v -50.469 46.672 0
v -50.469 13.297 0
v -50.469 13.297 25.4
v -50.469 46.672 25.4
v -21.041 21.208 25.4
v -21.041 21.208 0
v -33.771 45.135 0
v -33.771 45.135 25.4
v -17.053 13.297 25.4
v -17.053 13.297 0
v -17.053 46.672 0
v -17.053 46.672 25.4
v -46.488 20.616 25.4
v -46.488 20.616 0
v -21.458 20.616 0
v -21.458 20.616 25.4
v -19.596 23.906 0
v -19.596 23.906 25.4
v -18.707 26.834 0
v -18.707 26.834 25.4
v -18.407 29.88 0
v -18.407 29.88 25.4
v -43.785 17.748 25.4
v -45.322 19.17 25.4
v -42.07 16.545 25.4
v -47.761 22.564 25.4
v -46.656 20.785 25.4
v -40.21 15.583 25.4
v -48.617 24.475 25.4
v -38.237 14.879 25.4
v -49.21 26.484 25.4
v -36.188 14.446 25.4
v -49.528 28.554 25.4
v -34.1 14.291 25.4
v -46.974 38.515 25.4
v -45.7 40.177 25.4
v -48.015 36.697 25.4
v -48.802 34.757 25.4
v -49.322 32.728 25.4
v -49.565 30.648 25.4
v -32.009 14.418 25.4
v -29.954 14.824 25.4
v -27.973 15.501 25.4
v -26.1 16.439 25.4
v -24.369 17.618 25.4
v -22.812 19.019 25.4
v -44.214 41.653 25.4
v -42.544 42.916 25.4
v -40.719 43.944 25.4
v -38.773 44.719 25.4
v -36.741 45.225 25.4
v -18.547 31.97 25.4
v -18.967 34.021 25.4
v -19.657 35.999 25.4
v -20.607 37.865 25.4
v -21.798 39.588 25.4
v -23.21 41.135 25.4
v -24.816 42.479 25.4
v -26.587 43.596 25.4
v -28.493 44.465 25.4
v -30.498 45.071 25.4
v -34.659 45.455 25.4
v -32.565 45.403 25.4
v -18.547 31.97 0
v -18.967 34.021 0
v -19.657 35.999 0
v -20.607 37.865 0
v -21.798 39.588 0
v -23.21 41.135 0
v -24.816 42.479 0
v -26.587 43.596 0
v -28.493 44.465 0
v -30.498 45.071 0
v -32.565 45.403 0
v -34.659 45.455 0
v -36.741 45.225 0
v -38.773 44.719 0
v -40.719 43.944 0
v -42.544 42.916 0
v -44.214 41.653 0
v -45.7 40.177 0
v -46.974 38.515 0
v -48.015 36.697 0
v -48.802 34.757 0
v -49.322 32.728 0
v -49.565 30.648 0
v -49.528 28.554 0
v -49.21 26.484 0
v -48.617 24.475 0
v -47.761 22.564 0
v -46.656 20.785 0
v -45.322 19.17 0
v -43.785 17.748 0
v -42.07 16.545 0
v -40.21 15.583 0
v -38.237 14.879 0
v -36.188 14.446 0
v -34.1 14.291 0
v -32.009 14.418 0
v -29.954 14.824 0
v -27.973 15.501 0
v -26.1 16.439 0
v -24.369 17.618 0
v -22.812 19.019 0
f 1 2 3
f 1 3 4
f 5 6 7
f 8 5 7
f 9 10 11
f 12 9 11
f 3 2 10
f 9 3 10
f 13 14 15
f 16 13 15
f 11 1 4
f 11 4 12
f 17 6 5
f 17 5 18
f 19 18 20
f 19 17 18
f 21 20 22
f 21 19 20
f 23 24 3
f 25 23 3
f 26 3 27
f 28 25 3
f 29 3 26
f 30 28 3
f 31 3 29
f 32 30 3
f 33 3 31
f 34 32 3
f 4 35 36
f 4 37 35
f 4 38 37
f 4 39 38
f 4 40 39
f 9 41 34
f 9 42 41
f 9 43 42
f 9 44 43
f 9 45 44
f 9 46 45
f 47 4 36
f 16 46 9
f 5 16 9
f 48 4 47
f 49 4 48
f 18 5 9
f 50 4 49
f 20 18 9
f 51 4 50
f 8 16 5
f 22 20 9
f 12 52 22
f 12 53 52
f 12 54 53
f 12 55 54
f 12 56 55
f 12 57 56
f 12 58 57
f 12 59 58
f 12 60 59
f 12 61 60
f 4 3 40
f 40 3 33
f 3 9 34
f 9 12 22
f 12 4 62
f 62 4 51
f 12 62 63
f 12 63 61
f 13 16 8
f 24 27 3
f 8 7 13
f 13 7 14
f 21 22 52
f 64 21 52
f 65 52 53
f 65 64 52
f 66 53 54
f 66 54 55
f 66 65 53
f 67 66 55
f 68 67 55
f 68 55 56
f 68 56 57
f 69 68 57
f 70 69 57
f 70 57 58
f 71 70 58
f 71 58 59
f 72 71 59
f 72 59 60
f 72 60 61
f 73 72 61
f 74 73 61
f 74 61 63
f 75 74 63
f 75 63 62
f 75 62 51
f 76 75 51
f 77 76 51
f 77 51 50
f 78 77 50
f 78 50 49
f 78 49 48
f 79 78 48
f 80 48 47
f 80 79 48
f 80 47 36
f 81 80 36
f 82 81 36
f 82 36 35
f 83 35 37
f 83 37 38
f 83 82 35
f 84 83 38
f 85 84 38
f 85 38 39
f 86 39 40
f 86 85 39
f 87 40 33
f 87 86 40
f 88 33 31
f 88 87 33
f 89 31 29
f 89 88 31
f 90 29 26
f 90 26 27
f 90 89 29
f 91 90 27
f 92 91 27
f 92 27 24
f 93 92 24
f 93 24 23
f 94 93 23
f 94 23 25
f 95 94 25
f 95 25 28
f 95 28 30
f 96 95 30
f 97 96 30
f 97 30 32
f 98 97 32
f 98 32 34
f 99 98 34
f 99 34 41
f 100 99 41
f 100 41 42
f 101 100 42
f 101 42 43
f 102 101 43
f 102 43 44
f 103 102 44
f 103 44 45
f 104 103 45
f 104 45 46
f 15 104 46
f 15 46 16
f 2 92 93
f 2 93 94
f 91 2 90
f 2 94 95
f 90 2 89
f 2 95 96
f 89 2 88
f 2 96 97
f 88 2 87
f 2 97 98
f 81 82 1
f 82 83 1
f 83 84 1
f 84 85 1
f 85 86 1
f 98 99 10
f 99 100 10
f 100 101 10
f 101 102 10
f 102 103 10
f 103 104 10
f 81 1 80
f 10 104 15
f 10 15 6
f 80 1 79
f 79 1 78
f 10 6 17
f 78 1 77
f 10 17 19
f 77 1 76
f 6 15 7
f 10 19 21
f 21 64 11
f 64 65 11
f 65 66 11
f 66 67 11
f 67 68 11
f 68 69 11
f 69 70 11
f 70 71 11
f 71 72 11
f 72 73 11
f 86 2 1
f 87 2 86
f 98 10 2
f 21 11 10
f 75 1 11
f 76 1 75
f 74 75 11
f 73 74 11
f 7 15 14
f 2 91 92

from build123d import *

# Parameters (mm, degrees)
F0_W     = 33.416076
F0_H     = 33.374747
F0_R     = 15.588949
F1_DEPTH = 25.4
F3_DEPTH = 25.4


with BuildPart() as f1:
    # F0 (on Top) → F1 (new body)
    with BuildSketch(Plane.XY):
        with Locations((-33.761238, 29.984143)):
            Rectangle(F0_W, F0_H)
        with Locations((-33.995453, 29.879961)):
            Circle(F0_R, mode=Mode.SUBTRACT)
    extrude(amount=F1_DEPTH)

    # F2 (on Top) → F3 (join)
    with BuildSketch(Plane.XY):
        Polygon((-20.725947, 20.616256), (-33.770509, 45.134839), (-46.487864, 20.616256), align=None)
    extrude(amount=F3_DEPTH)


solid = f1.part
